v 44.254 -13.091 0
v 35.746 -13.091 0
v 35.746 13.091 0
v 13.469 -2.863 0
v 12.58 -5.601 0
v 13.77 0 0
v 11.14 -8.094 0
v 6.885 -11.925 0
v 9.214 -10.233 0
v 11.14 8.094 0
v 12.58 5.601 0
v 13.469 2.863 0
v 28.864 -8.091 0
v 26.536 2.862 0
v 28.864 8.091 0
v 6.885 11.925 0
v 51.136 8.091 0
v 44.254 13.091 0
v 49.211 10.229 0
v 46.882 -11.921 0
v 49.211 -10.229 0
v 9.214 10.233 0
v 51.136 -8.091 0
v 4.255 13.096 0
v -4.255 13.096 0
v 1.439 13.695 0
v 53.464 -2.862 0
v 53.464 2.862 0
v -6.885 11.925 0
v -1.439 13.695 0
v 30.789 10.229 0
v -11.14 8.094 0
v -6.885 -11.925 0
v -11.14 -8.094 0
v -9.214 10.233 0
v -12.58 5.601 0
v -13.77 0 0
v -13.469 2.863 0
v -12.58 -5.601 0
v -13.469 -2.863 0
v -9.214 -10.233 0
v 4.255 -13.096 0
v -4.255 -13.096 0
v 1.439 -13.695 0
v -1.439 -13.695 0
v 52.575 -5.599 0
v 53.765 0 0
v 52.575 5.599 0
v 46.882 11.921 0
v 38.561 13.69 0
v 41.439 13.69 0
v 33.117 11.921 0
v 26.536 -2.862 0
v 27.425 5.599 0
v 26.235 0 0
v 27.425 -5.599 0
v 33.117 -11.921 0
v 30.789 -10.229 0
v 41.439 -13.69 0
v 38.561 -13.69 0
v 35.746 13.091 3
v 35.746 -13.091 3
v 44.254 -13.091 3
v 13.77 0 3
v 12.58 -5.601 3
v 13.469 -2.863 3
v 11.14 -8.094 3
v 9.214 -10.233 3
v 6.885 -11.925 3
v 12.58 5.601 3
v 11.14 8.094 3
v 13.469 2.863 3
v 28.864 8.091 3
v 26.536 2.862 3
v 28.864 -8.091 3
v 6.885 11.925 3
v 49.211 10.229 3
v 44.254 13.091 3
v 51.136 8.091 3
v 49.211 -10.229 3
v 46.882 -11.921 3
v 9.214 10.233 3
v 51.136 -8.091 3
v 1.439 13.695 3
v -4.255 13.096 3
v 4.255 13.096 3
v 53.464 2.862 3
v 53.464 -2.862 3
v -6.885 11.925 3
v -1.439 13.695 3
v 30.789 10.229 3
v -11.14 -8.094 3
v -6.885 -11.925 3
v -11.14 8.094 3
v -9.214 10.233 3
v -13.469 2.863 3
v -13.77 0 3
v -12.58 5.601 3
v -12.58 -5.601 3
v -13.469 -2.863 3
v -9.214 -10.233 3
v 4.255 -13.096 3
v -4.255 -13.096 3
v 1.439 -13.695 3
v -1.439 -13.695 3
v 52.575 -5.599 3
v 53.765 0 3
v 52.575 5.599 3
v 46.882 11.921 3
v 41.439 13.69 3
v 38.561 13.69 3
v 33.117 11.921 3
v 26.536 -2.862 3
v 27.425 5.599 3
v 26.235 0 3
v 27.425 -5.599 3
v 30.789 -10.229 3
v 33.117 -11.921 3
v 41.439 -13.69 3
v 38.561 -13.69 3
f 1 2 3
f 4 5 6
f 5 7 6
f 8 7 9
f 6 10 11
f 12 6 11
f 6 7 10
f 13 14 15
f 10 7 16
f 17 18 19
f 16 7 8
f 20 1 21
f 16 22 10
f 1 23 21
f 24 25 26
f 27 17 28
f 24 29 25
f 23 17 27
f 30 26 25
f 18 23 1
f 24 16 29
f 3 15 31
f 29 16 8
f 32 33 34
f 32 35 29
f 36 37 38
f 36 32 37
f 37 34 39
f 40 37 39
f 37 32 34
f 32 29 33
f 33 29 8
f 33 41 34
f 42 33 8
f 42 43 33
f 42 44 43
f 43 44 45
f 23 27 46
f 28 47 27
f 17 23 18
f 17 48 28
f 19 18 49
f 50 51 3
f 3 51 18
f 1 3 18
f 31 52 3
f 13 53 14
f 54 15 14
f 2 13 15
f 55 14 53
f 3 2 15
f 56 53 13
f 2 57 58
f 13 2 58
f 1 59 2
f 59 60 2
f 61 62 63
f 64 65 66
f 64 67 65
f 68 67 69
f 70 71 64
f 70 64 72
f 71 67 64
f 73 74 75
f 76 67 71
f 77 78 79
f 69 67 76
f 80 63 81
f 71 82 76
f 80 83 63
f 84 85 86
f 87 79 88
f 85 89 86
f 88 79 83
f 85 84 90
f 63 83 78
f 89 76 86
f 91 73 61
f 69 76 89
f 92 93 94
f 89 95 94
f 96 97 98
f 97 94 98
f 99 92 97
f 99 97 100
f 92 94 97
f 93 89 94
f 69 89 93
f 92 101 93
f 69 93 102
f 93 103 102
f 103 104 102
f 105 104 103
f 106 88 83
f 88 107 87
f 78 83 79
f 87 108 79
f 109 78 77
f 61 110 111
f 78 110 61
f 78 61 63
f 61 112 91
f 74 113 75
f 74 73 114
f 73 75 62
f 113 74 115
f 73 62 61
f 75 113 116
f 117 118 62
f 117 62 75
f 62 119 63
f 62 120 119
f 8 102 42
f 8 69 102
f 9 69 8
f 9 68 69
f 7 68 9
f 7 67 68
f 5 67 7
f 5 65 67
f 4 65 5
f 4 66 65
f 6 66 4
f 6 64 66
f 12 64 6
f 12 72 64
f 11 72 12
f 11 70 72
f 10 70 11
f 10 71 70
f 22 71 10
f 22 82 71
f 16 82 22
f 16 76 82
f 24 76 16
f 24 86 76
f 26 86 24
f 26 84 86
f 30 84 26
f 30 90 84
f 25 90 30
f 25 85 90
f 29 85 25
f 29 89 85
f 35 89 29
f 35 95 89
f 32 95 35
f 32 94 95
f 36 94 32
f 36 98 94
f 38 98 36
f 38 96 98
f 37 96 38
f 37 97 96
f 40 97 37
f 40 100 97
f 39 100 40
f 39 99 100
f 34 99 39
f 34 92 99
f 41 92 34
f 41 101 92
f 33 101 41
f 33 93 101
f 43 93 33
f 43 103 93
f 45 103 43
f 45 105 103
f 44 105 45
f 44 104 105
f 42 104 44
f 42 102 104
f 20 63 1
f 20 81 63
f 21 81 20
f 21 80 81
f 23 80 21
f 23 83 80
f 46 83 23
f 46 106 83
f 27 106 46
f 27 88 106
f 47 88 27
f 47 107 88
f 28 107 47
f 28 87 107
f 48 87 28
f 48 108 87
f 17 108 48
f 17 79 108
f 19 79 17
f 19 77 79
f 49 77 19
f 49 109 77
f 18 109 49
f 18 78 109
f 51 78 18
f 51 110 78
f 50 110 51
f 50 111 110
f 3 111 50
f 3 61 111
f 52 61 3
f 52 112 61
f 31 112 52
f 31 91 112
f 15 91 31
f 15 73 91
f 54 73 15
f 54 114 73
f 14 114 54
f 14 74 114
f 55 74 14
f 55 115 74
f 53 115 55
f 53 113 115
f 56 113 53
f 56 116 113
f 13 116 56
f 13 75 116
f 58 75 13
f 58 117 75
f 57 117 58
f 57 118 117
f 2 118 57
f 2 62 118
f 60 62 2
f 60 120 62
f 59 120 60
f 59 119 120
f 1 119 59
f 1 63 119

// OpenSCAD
linear_extrude(3) { circle(r = 13.77); translate([40,0]) circle(d = 27.53); }
